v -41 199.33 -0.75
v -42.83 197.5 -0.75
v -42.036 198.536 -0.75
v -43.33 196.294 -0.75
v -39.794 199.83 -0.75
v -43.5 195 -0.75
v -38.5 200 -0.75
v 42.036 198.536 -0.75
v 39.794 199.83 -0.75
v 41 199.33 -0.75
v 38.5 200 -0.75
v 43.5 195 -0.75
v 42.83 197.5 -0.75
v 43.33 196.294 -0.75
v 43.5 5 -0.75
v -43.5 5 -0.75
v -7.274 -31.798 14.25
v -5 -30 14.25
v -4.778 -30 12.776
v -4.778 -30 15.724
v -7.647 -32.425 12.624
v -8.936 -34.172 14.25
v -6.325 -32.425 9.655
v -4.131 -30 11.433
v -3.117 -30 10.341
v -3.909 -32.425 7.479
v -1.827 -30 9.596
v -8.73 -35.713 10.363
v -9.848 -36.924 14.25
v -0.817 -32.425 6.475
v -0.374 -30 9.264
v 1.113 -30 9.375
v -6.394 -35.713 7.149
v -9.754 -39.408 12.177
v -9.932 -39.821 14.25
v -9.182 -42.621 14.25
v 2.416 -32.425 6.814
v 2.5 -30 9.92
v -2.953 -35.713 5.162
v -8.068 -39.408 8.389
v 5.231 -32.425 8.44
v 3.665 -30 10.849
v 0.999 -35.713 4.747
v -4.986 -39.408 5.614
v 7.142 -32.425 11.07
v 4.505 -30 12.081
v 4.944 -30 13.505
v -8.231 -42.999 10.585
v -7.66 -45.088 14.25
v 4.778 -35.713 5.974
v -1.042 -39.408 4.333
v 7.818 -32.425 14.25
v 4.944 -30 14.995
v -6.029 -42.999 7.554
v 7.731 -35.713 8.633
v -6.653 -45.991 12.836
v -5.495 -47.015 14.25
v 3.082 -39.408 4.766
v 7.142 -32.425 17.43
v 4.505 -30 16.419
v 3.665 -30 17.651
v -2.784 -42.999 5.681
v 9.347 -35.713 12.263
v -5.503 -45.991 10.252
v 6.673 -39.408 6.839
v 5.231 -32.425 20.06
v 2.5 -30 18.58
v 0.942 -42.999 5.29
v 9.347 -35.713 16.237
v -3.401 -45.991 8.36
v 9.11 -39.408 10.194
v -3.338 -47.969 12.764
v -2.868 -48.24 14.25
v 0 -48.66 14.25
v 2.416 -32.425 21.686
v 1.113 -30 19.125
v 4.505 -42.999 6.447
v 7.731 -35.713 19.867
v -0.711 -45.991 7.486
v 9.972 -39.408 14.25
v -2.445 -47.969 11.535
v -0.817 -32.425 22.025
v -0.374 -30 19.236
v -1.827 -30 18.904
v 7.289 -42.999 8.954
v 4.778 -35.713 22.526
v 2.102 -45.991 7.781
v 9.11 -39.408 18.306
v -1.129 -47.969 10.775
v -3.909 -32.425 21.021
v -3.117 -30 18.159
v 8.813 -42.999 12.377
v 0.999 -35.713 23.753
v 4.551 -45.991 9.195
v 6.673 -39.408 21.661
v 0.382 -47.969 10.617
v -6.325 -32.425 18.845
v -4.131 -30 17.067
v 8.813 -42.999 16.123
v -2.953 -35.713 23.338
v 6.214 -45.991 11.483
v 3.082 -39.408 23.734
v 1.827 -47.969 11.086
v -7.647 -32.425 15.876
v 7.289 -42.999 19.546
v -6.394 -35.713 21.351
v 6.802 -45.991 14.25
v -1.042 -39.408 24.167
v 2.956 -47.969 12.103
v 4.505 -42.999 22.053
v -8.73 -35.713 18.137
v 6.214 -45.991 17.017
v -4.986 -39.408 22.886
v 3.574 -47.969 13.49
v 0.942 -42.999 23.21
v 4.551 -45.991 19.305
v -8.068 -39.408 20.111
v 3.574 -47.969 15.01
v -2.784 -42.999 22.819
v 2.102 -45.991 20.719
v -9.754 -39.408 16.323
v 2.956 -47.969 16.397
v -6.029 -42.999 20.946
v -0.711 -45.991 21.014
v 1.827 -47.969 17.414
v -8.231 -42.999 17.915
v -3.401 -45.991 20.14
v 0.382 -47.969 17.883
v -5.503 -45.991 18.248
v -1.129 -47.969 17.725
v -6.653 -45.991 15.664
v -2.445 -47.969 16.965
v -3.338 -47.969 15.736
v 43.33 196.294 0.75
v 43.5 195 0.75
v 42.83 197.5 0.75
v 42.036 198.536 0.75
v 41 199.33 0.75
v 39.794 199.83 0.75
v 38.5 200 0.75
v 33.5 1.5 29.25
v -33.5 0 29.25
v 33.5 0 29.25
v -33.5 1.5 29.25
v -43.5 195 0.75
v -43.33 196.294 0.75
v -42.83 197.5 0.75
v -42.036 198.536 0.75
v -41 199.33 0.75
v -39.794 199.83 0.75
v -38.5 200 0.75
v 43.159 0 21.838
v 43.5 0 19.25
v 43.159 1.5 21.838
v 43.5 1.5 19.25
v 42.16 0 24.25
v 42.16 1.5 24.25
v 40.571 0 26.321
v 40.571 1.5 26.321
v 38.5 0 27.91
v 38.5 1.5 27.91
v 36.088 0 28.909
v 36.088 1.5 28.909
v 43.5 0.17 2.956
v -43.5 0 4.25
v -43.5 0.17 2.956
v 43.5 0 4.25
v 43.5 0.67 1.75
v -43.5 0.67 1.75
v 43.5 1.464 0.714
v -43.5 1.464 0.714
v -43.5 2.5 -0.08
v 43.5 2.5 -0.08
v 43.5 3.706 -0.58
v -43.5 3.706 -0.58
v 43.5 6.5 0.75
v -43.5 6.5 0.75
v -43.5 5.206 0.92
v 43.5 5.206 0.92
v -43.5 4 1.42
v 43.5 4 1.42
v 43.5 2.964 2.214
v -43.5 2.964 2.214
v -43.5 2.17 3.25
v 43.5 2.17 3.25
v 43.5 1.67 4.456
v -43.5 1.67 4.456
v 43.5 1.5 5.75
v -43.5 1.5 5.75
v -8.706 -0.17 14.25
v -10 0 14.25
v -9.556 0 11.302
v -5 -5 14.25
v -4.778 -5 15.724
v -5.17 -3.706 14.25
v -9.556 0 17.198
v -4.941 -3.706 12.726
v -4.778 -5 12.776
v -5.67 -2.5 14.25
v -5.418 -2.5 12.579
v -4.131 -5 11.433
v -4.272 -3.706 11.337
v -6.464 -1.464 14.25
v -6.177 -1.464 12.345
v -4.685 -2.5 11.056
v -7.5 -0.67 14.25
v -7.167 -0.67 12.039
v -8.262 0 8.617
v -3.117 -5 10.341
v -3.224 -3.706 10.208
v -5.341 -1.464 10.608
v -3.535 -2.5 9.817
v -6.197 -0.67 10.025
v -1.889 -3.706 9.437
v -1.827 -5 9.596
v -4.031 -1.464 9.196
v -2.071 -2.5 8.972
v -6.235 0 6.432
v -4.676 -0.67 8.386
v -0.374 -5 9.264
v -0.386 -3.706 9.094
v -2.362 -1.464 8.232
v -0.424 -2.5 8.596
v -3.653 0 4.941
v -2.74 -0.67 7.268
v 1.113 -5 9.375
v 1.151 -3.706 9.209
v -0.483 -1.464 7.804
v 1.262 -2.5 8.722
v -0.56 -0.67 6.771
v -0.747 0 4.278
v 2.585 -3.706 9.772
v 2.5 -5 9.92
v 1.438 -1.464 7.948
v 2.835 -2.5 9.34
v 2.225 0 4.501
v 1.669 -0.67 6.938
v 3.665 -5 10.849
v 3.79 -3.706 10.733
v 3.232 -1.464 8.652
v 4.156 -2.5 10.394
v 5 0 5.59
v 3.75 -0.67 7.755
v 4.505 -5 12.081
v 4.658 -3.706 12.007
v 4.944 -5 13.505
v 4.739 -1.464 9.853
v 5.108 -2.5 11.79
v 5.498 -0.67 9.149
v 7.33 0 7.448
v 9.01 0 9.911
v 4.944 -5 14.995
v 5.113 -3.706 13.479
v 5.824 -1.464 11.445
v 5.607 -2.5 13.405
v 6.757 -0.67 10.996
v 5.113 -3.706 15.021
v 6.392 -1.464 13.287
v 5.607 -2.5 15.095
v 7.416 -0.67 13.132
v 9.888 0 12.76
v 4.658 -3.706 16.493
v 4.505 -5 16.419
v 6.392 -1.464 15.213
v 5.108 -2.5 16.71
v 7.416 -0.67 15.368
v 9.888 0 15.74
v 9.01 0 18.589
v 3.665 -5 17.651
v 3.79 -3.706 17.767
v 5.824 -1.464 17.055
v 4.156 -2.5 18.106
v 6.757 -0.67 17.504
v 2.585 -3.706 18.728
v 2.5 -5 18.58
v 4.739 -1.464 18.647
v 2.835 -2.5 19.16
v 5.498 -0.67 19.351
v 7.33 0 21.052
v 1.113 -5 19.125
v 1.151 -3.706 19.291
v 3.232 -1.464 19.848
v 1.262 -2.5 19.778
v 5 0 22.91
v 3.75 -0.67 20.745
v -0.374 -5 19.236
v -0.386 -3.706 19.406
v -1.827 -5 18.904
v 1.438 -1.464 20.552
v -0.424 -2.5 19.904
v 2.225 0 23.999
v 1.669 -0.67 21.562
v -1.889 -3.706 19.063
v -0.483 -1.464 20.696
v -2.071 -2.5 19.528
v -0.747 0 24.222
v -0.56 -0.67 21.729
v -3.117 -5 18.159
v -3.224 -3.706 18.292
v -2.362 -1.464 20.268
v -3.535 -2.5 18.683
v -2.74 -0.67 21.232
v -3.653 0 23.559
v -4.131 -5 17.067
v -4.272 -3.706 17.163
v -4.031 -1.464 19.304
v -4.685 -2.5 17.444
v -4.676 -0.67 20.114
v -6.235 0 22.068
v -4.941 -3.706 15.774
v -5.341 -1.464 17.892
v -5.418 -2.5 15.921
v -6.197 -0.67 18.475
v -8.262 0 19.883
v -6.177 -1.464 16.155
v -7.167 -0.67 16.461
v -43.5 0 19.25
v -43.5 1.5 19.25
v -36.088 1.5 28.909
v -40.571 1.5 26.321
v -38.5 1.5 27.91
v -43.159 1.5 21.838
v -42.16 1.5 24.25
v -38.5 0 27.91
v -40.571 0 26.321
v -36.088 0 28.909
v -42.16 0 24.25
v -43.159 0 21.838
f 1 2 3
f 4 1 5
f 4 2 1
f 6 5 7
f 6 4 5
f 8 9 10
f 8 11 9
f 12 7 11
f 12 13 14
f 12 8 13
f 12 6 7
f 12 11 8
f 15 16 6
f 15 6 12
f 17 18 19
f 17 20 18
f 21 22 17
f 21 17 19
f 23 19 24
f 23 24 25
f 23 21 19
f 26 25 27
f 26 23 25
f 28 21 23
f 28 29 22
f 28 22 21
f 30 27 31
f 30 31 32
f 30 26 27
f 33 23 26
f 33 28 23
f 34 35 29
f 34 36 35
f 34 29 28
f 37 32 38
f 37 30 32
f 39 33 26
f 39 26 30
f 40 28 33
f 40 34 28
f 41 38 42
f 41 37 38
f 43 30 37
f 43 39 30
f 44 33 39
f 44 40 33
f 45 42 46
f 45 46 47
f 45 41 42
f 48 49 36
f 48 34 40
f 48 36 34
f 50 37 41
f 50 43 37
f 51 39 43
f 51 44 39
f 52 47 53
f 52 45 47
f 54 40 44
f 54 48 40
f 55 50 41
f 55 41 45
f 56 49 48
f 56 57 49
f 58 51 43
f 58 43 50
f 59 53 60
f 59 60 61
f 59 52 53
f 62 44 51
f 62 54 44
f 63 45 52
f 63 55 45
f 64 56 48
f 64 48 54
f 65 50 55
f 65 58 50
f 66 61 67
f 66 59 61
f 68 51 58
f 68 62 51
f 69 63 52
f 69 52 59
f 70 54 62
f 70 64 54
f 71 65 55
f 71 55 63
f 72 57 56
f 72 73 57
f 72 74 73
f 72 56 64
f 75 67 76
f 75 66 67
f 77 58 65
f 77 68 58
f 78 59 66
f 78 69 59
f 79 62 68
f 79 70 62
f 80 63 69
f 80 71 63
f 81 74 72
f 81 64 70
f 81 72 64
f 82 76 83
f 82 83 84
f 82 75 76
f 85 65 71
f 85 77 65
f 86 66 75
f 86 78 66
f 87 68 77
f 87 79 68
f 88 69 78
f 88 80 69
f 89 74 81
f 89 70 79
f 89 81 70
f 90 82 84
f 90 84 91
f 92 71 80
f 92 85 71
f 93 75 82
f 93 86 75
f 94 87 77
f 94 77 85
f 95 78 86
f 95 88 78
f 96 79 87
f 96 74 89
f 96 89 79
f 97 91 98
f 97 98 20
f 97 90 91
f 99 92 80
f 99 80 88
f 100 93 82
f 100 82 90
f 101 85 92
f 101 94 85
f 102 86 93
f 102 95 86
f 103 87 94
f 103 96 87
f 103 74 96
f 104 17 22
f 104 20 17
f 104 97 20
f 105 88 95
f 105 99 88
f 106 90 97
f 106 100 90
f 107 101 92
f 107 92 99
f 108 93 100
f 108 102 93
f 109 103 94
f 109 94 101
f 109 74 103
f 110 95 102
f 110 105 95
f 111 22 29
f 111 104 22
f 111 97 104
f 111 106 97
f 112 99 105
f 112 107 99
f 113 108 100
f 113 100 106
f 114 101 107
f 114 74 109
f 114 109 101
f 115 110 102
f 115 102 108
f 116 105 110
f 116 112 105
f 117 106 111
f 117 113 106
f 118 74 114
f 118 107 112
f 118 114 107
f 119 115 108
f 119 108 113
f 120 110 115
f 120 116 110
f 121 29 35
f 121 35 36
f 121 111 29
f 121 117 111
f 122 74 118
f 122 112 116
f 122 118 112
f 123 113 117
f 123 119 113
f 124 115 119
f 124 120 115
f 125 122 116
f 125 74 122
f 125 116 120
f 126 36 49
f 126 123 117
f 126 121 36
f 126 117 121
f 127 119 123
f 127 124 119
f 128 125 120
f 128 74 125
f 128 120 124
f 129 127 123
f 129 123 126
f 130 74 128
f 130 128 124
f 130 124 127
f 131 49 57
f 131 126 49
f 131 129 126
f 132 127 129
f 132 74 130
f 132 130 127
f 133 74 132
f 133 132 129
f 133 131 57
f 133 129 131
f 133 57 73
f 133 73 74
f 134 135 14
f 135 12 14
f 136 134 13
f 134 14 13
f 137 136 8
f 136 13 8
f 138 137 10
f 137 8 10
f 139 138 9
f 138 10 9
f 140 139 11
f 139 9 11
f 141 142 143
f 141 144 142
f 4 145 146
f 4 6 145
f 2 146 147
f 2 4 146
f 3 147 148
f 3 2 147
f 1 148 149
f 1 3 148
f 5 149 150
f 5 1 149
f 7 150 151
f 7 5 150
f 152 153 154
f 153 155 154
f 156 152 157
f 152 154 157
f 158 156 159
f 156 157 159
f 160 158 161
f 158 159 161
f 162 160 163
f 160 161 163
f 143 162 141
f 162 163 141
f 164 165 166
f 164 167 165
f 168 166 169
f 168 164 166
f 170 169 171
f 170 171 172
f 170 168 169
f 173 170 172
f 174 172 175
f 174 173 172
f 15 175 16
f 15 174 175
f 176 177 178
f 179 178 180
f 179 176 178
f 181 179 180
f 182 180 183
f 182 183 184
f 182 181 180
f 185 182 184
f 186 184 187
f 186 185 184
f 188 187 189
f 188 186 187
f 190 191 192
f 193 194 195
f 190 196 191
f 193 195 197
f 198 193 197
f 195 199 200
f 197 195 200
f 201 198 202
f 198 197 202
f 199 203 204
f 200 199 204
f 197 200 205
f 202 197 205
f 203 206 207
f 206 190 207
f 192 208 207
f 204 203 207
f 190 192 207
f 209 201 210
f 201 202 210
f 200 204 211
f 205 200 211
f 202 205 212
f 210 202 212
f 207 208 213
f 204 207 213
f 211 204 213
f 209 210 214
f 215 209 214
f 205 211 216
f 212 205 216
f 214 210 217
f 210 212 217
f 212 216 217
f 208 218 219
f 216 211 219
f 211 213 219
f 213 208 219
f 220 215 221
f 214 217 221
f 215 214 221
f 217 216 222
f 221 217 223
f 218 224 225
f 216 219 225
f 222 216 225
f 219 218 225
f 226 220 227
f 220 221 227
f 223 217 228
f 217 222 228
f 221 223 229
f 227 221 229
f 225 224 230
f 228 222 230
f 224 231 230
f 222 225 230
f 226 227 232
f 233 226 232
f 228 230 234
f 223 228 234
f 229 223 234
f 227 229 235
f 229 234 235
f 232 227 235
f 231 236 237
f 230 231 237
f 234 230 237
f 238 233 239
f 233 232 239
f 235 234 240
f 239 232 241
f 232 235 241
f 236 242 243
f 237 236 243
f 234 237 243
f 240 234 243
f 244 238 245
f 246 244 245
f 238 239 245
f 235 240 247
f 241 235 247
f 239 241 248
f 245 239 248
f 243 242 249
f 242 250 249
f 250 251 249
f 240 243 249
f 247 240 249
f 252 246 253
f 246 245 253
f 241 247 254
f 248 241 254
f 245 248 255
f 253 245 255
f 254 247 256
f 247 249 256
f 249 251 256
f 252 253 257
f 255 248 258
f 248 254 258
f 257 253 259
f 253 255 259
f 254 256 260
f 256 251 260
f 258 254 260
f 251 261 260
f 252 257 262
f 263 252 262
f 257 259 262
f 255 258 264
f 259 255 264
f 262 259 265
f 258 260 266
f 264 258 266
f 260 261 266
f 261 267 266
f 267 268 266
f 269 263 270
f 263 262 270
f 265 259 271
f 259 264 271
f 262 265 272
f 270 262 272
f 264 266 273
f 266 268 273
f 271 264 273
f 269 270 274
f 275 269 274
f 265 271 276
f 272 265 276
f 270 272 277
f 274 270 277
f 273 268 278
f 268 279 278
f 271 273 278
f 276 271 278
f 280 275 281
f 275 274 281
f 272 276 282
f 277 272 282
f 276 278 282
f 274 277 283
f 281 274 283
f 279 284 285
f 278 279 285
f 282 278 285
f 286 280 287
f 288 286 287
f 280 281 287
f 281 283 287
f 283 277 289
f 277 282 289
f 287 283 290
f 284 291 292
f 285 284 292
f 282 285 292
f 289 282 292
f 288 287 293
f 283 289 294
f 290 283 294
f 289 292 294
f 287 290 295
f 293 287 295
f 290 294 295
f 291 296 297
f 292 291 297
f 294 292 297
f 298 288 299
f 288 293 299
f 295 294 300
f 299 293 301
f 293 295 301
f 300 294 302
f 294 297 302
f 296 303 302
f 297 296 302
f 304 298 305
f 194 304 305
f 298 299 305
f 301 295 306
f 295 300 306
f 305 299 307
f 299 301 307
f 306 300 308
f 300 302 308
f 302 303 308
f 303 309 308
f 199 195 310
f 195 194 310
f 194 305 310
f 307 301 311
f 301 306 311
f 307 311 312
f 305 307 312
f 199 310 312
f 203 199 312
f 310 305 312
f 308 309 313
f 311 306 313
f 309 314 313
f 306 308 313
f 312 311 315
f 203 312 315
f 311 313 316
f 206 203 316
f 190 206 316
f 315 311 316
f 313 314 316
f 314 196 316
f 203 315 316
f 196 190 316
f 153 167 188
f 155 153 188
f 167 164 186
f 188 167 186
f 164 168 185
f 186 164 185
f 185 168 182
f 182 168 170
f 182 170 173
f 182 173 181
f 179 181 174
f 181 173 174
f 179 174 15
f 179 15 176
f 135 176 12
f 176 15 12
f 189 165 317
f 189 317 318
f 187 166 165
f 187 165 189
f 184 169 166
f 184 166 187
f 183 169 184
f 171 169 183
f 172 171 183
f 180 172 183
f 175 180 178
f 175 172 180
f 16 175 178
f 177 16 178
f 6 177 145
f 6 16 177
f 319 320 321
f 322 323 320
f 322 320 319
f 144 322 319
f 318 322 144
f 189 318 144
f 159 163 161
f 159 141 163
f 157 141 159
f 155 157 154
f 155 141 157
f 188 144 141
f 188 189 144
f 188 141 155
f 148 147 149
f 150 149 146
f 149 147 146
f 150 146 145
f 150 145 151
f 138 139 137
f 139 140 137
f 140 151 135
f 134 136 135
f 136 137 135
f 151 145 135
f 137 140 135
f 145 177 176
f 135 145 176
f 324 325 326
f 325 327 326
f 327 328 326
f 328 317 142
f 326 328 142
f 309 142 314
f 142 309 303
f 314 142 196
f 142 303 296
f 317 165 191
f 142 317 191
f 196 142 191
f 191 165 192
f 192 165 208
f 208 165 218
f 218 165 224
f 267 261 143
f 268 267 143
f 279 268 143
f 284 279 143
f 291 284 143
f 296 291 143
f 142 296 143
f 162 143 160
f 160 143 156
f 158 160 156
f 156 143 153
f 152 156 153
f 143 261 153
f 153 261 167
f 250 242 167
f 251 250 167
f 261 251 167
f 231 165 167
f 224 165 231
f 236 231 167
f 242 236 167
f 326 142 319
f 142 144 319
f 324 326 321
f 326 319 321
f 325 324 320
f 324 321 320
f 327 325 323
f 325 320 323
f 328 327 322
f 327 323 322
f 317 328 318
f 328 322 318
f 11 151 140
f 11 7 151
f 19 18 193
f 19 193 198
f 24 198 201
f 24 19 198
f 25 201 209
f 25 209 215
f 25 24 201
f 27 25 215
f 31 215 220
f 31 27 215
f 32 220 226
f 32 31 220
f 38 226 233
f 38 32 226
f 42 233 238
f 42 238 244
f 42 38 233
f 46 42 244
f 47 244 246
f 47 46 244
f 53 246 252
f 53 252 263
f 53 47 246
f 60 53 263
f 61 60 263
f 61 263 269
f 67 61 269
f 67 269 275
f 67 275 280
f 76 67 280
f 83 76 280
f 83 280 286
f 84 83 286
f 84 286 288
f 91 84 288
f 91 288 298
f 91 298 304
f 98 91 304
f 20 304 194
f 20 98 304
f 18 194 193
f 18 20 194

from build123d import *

# Parameters (mm, degrees)
SKETCH1_W           = 87
SKETCH1_H           = 1.5
BOSS_EXTRUDE1_DEPTH = 200
SKETCH2_W           = 87
SKETCH2_H           = 1.5
BOSS_EXTRUDE2_DEPTH = 28.5
FILLET1_R           = 5
FILLET2_R           = 5
FILLET3_R           = 5
FILLET4_R           = 10


with BuildPart() as part:
    # Sketch1 → Boss-Extrude1 (new body)
    with BuildSketch(Plane(origin=(0, 0, 0), x_dir=(1, 0, 0), z_dir=(0, 1, 0))):
        Rectangle(SKETCH1_W, SKETCH1_H)
    extrude(amount=BOSS_EXTRUDE1_DEPTH)

    # Sketch2 → Boss-Extrude2 (add)
    with BuildSketch(Plane.XY.offset(0.75)):
        with Locations((0, 0.75)):
            Rectangle(SKETCH2_W, SKETCH2_H)
    extrude(amount=BOSS_EXTRUDE2_DEPTH)

    # Fillet1
    fillet1_edges = [part.edges().sort_by_distance(p)[0] for p in [
        (0, 1.5, 0.75),
        (0, 0, -0.75),
    ]]
    fillet(fillet1_edges, radius=FILLET1_R)

    # Sketch4 → Revolve1 (revolve)
    with BuildSketch(Plane.XY.offset(14.25), mode=Mode.PRIVATE) as revolve1_sk:
        with BuildLine():
            Line((5, 0), (5, -30))
            ThreePointArc((5, -30), (9.659258263, -41.248444489), (0, -48.660254038))
            Line((0, -48.660254038), (0, 0))
            Line((0, 0), (0, 0.59177988))
            Line((0, 0.59177988), (5, 0.59177988))
            Line((5, 0.59177988), (5, 0))
        make_face()
    revolve(revolve1_sk.sketch.rotate(Axis((0, 0, 14.25), (0, -1, 0)), 180), axis=Axis((0, 0, 14.25), (0, -1, 0)))

    # Fillet2
    fillet2_edges = [part.edges().sort_by_distance(p)[0] for p in [
        (5, 0, 14.25),
    ]]
    fillet(fillet2_edges, radius=FILLET2_R - 0.0001)  # a hair under: the kernel refuses the full size

    # Fillet3
    fillet3_edges = [part.edges().sort_by_distance(p)[0] for p in [
        (43.5, 200, 0),
        (-43.5, 200, 0),
    ]]
    fillet(fillet3_edges, radius=FILLET3_R)

    # Fillet4
    fillet4_edges = [part.edges().sort_by_distance(p)[0] for p in [
        (-43.5, 0.75, 29.25),
        (43.5, 0.75, 29.25),
    ]]
    fillet(fillet4_edges, radius=FILLET4_R)


solid = part.part
